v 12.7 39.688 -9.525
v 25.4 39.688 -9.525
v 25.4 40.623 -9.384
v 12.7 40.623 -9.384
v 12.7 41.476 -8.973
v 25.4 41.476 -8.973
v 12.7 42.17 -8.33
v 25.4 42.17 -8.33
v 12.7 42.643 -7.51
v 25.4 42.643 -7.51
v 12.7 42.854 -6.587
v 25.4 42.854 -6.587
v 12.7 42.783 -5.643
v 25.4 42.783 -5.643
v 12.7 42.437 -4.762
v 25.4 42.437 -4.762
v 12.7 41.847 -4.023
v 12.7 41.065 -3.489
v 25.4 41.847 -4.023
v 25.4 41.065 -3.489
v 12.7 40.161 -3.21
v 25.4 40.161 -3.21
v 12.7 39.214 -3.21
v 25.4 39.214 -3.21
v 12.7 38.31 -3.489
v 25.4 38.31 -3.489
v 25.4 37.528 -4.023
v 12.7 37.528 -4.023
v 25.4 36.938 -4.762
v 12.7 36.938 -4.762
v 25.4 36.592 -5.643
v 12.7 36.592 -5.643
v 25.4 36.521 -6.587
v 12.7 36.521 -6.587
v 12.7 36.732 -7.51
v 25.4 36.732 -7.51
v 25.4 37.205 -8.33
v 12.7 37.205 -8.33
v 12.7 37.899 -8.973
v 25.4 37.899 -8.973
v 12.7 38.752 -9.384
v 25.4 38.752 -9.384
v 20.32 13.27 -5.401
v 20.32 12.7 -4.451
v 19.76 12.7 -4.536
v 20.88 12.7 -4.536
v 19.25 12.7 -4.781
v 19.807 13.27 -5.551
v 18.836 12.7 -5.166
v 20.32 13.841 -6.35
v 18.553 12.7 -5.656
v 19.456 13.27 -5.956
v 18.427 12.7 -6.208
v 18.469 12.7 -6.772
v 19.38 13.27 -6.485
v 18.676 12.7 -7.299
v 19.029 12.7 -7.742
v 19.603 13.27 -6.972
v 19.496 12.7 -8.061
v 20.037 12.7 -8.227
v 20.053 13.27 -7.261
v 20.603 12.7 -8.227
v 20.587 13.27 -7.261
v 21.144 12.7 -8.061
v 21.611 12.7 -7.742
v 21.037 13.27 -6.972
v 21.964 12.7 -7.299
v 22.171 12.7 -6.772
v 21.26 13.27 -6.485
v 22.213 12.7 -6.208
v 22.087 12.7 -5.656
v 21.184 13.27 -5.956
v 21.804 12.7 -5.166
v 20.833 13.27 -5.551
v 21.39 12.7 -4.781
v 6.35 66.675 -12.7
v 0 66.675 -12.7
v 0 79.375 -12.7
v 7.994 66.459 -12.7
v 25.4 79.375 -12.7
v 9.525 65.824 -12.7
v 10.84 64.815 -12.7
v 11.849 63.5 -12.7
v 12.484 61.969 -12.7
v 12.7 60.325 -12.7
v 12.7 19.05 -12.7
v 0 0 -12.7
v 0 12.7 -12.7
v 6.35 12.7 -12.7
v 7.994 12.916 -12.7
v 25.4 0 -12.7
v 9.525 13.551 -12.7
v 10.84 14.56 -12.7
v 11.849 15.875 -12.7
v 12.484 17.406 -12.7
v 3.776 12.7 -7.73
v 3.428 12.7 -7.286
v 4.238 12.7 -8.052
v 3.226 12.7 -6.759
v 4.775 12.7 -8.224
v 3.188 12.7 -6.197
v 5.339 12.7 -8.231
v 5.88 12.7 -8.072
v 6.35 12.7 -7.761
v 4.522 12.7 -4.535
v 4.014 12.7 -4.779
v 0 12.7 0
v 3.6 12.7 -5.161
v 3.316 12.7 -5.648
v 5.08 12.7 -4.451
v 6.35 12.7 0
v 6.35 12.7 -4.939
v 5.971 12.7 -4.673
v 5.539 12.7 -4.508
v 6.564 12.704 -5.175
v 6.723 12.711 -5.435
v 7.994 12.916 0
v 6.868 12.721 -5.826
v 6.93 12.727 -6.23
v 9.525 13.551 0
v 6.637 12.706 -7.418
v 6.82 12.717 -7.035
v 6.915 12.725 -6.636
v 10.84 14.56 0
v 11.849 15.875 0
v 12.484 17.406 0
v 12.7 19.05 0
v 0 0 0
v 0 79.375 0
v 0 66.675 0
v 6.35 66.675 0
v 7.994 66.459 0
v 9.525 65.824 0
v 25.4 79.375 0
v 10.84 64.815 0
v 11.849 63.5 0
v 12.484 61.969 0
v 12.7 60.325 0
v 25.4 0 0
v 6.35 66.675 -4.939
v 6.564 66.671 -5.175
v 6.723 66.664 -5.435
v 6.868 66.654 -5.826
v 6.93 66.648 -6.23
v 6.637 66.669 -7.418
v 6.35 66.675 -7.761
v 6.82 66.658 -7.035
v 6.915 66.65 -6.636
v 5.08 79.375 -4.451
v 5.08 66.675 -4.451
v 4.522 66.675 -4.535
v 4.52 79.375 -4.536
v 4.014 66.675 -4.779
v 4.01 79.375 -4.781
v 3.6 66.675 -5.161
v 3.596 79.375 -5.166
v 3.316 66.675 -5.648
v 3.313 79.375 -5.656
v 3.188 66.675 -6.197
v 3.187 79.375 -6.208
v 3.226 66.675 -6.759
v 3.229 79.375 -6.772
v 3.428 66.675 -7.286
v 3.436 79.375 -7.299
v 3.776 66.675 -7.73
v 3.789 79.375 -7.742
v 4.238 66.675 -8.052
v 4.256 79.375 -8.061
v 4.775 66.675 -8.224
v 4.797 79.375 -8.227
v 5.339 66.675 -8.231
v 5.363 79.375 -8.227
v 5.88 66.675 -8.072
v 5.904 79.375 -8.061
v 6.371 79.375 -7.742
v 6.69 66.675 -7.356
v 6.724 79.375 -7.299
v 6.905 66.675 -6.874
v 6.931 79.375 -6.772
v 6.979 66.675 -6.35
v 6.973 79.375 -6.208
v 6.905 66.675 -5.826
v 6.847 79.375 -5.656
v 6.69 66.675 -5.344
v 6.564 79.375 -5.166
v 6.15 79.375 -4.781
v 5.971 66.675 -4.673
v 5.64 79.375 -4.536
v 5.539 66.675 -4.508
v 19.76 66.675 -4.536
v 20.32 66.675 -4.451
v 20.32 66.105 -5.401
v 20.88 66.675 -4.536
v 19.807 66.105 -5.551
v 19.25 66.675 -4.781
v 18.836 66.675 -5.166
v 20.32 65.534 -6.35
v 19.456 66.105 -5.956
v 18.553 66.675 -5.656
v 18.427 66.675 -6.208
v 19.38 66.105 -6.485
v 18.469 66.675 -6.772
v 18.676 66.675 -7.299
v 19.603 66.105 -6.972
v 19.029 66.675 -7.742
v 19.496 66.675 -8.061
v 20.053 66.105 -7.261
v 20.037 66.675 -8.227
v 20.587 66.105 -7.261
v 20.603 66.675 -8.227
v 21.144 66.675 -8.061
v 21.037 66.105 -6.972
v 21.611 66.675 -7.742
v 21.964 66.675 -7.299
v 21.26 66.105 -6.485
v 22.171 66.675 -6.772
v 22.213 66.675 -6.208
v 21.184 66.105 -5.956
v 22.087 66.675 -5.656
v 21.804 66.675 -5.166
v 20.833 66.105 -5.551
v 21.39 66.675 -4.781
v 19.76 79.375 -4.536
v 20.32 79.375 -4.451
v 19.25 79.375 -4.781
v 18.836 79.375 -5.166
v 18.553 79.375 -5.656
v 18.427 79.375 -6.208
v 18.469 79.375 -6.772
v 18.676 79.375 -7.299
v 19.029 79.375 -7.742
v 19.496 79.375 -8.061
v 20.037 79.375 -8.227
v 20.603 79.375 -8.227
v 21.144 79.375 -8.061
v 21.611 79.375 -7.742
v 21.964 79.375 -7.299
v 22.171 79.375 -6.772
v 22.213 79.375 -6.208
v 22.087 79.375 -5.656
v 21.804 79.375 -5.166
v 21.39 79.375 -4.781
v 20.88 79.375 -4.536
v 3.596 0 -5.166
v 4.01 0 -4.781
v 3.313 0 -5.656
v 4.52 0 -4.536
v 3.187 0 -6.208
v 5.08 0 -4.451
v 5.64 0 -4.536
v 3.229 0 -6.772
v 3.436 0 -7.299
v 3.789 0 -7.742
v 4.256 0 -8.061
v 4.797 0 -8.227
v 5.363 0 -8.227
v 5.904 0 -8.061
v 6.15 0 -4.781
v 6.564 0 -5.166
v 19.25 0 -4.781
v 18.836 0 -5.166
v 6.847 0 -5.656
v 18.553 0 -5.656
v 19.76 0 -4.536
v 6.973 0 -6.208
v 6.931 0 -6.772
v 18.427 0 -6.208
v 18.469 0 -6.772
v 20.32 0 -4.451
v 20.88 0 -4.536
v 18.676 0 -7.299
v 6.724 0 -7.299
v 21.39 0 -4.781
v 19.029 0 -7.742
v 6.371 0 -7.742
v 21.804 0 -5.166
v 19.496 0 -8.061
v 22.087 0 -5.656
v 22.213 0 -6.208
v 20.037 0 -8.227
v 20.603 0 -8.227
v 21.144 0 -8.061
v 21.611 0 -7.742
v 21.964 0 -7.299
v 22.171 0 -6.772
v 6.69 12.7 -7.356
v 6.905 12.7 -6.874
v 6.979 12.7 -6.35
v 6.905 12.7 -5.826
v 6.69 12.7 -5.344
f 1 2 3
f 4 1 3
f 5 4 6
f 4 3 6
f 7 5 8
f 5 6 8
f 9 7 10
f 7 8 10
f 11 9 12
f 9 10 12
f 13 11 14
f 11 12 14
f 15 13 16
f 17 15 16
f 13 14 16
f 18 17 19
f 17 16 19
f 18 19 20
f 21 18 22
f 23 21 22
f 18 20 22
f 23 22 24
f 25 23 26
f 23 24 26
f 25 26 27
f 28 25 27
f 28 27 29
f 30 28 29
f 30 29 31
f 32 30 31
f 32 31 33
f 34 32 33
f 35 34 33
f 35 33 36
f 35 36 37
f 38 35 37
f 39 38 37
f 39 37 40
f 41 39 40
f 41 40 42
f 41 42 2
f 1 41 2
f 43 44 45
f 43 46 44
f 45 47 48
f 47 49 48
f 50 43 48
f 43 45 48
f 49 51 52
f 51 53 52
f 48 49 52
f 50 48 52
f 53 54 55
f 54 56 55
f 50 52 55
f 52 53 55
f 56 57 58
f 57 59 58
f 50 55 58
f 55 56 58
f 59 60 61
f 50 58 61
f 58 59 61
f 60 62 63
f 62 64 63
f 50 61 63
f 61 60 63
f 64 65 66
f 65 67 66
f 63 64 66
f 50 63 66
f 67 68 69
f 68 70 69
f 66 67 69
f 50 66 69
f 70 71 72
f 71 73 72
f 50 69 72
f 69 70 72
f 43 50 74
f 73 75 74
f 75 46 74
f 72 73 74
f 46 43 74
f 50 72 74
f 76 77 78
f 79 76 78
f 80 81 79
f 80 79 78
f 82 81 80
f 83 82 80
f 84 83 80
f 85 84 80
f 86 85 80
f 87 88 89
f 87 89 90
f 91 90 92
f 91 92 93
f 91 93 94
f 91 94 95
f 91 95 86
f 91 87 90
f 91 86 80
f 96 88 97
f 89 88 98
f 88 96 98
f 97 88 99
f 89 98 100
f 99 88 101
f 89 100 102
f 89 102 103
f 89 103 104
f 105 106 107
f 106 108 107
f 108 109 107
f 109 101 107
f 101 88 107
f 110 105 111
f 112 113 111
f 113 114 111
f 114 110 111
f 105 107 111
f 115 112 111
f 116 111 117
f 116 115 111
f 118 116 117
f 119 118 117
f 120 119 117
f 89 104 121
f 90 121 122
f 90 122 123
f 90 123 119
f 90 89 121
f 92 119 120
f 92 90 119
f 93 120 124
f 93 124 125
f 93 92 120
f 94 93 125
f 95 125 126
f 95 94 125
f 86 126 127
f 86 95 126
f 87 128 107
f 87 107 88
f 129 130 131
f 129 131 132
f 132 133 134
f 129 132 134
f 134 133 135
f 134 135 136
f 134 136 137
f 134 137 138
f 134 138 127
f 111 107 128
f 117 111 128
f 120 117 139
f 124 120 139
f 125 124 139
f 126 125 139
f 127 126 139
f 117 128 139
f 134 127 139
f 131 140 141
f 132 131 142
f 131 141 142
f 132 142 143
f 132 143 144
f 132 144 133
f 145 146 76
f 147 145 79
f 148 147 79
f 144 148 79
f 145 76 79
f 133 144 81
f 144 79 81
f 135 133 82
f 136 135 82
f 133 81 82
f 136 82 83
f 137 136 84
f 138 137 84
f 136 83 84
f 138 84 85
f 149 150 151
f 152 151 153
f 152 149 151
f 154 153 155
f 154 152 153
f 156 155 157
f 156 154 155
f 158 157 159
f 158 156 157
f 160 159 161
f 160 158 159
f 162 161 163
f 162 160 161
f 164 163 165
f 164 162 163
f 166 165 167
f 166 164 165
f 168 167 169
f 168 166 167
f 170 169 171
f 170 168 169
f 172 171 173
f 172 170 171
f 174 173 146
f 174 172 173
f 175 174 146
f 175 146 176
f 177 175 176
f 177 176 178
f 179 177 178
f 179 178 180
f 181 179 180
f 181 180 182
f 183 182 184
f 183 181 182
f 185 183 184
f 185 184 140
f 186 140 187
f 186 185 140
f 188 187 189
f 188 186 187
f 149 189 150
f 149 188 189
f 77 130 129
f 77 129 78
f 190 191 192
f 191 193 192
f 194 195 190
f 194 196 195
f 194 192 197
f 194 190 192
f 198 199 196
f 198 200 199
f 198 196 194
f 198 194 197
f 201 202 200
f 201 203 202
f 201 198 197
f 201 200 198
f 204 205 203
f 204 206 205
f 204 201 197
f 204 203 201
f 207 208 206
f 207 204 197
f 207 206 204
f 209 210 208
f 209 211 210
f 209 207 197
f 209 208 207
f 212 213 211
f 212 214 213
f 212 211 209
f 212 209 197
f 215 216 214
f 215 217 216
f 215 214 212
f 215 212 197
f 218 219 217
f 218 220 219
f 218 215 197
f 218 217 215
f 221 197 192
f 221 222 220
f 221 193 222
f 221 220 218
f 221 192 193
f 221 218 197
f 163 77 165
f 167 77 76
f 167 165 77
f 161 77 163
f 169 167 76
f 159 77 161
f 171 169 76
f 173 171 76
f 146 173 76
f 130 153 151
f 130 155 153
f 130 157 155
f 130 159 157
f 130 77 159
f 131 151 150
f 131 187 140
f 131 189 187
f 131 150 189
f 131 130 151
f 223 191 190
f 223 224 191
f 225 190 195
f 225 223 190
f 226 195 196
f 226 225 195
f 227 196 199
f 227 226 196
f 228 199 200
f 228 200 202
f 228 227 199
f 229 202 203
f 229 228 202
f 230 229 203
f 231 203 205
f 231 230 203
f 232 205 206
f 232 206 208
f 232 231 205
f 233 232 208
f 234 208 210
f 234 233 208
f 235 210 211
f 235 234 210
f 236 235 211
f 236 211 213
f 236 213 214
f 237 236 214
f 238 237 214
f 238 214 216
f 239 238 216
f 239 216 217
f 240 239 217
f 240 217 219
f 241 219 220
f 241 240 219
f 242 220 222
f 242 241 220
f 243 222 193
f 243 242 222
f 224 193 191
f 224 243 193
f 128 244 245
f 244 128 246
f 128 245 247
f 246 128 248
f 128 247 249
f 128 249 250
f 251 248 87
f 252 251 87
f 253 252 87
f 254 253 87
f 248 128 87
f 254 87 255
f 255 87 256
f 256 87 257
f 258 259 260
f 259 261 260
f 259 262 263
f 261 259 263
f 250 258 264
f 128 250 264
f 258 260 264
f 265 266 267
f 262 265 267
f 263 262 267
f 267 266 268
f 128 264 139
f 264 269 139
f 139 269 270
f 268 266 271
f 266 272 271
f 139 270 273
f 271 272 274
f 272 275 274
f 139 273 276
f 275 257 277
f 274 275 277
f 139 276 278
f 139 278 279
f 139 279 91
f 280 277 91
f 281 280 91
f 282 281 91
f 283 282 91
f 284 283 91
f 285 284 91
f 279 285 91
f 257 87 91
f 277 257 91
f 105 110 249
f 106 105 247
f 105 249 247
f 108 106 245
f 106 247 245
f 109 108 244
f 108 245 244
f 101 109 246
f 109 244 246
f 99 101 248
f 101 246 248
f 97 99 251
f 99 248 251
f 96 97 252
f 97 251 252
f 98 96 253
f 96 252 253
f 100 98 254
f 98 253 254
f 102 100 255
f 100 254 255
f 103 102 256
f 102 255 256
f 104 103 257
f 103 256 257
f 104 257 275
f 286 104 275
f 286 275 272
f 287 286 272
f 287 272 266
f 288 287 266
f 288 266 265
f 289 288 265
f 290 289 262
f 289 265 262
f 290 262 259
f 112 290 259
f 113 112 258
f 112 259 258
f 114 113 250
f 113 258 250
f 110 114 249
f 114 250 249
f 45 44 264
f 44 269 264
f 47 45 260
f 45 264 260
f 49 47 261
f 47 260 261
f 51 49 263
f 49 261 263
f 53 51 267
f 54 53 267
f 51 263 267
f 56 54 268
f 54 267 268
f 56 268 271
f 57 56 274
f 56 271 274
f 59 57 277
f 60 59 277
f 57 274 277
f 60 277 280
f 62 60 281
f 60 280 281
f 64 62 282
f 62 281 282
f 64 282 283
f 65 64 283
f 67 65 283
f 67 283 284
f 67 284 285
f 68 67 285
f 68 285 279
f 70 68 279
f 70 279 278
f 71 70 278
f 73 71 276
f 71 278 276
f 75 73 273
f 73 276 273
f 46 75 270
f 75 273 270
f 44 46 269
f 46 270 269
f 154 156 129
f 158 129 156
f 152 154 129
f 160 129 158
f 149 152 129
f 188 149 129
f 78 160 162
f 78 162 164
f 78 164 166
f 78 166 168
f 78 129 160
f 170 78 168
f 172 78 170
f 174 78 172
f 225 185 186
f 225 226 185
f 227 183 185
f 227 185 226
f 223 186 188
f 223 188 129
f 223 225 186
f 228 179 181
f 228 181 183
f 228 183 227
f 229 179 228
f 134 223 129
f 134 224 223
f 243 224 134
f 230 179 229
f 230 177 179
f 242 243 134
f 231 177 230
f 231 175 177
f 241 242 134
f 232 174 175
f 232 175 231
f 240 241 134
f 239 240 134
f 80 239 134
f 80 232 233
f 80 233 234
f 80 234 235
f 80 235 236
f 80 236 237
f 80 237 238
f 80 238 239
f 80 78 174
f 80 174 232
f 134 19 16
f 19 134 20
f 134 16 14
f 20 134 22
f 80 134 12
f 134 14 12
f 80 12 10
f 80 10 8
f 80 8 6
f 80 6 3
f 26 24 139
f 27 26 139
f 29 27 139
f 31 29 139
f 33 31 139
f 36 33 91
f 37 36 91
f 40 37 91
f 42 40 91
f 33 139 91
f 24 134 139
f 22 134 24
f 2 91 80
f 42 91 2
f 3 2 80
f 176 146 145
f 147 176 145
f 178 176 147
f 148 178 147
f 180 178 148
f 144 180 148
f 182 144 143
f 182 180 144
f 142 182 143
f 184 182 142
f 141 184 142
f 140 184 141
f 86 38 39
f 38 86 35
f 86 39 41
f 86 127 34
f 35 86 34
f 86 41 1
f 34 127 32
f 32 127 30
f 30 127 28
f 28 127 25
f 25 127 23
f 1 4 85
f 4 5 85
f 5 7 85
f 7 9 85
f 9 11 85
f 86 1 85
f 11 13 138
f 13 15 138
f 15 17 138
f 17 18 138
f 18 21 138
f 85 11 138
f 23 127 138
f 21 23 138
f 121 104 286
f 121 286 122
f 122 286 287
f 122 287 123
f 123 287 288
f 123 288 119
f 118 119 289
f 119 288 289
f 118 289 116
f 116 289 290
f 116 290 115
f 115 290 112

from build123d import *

# Parameters (mm, degrees)
SKETCH1_W                          = 25.4
SKETCH1_H                          = 12.7
STOCK_DEPTH                        = 79.375
SKETCH2_W                          = 12.7
SKETCH2_H                          = 53.975
CUTOUT_DEPTH                       = 85.302079601
FILLET1_R                          = 6.35
F_1_4_0_25_DIAMETER_HOLE1_D        = 6.35
MOUNTING_HOLES_ONE_SIDE_AT_2_COUNT = 2
MOUNTING_HOLES_ONE_SIDE_AT_2_PITCH = 15.24


with BuildPart() as part:
    # Sketch1 → Stock (new body)
    with BuildSketch(Plane(origin=(0, 0, 0), x_dir=(1, 0, 0), z_dir=(0, 1, 0))):
        with Locations((12.7, 6.35)):
            Rectangle(SKETCH1_W, SKETCH1_H)
    extrude(amount=STOCK_DEPTH)

    # Sketch2 → Cutout (cut, through all)
    with BuildSketch(Plane.XY):
        with Locations((6.35, 39.6875)):
            Rectangle(SKETCH2_W, SKETCH2_H)
    extrude(amount=-CUTOUT_DEPTH, mode=Mode.SUBTRACT)

    # Fillet1
    fillet1_edges = [part.edges().sort_by_distance(p)[0] for p in [
        (12.7, 66.675, -6.35),
        (12.7, 12.7, -6.35),
    ]]
    fillet(fillet1_edges, radius=FILLET1_R)

    # 1/4 (0.25) Diameter Hole1 (through all)
    with Locations(Plane.ZY.offset(-12.7)):
        with Locations((-6.35, 39.6875)):
            Hole(F_1_4_0_25_DIAMETER_HOLE1_D / 2)

    # Sketch8 → Mounting Holes One Side (revolve, cut)
    with BuildSketch(Plane(origin=(5.08, 79.375, -6.35), x_dir=(0, 0, 1), z_dir=(1, 0, 0))):
        Polygon((0, 0), (0, 13.840824014), (1.89865, 12.7), (1.89865, 0), align=None)
    mounting_holes_one_side = revolve(axis=Axis((5.08, 85.725, -6.35), (0, -1, 0)), mode=Mode.SUBTRACT)

    # Mounting Holes One Side at 2: Mounting Holes One Side ×2
    with Locations(*[(i * MOUNTING_HOLES_ONE_SIDE_AT_2_PITCH, 0, 0) for i in range(1, MOUNTING_HOLES_ONE_SIDE_AT_2_COUNT)]):
        add(mounting_holes_one_side, mode=Mode.SUBTRACT)

    # Mounting Holes: Mounting Holes One Side across plane
    add(mounting_holes_one_side.mirror(Plane(origin=(0, 39.6875, 0), x_dir=(0, 0, 1), z_dir=(0, -1, 0))), mode=Mode.SUBTRACT)

    # Mounting Holes copy 1 sketch → Mounting Holes copy 1 (revolve, cut)
    with BuildSketch(Plane(origin=(20.32, 0, -6.35), x_dir=(0, 0, 1), z_dir=(1, 0, 0))):
        Polygon((0, 0), (0, -13.840824014), (1.89865, -12.7), (1.89865, 0), align=None)
    revolve(axis=Axis((20.32, -6.35, -6.35), (0, -1, 0)), mode=Mode.SUBTRACT)


solid = part.part
